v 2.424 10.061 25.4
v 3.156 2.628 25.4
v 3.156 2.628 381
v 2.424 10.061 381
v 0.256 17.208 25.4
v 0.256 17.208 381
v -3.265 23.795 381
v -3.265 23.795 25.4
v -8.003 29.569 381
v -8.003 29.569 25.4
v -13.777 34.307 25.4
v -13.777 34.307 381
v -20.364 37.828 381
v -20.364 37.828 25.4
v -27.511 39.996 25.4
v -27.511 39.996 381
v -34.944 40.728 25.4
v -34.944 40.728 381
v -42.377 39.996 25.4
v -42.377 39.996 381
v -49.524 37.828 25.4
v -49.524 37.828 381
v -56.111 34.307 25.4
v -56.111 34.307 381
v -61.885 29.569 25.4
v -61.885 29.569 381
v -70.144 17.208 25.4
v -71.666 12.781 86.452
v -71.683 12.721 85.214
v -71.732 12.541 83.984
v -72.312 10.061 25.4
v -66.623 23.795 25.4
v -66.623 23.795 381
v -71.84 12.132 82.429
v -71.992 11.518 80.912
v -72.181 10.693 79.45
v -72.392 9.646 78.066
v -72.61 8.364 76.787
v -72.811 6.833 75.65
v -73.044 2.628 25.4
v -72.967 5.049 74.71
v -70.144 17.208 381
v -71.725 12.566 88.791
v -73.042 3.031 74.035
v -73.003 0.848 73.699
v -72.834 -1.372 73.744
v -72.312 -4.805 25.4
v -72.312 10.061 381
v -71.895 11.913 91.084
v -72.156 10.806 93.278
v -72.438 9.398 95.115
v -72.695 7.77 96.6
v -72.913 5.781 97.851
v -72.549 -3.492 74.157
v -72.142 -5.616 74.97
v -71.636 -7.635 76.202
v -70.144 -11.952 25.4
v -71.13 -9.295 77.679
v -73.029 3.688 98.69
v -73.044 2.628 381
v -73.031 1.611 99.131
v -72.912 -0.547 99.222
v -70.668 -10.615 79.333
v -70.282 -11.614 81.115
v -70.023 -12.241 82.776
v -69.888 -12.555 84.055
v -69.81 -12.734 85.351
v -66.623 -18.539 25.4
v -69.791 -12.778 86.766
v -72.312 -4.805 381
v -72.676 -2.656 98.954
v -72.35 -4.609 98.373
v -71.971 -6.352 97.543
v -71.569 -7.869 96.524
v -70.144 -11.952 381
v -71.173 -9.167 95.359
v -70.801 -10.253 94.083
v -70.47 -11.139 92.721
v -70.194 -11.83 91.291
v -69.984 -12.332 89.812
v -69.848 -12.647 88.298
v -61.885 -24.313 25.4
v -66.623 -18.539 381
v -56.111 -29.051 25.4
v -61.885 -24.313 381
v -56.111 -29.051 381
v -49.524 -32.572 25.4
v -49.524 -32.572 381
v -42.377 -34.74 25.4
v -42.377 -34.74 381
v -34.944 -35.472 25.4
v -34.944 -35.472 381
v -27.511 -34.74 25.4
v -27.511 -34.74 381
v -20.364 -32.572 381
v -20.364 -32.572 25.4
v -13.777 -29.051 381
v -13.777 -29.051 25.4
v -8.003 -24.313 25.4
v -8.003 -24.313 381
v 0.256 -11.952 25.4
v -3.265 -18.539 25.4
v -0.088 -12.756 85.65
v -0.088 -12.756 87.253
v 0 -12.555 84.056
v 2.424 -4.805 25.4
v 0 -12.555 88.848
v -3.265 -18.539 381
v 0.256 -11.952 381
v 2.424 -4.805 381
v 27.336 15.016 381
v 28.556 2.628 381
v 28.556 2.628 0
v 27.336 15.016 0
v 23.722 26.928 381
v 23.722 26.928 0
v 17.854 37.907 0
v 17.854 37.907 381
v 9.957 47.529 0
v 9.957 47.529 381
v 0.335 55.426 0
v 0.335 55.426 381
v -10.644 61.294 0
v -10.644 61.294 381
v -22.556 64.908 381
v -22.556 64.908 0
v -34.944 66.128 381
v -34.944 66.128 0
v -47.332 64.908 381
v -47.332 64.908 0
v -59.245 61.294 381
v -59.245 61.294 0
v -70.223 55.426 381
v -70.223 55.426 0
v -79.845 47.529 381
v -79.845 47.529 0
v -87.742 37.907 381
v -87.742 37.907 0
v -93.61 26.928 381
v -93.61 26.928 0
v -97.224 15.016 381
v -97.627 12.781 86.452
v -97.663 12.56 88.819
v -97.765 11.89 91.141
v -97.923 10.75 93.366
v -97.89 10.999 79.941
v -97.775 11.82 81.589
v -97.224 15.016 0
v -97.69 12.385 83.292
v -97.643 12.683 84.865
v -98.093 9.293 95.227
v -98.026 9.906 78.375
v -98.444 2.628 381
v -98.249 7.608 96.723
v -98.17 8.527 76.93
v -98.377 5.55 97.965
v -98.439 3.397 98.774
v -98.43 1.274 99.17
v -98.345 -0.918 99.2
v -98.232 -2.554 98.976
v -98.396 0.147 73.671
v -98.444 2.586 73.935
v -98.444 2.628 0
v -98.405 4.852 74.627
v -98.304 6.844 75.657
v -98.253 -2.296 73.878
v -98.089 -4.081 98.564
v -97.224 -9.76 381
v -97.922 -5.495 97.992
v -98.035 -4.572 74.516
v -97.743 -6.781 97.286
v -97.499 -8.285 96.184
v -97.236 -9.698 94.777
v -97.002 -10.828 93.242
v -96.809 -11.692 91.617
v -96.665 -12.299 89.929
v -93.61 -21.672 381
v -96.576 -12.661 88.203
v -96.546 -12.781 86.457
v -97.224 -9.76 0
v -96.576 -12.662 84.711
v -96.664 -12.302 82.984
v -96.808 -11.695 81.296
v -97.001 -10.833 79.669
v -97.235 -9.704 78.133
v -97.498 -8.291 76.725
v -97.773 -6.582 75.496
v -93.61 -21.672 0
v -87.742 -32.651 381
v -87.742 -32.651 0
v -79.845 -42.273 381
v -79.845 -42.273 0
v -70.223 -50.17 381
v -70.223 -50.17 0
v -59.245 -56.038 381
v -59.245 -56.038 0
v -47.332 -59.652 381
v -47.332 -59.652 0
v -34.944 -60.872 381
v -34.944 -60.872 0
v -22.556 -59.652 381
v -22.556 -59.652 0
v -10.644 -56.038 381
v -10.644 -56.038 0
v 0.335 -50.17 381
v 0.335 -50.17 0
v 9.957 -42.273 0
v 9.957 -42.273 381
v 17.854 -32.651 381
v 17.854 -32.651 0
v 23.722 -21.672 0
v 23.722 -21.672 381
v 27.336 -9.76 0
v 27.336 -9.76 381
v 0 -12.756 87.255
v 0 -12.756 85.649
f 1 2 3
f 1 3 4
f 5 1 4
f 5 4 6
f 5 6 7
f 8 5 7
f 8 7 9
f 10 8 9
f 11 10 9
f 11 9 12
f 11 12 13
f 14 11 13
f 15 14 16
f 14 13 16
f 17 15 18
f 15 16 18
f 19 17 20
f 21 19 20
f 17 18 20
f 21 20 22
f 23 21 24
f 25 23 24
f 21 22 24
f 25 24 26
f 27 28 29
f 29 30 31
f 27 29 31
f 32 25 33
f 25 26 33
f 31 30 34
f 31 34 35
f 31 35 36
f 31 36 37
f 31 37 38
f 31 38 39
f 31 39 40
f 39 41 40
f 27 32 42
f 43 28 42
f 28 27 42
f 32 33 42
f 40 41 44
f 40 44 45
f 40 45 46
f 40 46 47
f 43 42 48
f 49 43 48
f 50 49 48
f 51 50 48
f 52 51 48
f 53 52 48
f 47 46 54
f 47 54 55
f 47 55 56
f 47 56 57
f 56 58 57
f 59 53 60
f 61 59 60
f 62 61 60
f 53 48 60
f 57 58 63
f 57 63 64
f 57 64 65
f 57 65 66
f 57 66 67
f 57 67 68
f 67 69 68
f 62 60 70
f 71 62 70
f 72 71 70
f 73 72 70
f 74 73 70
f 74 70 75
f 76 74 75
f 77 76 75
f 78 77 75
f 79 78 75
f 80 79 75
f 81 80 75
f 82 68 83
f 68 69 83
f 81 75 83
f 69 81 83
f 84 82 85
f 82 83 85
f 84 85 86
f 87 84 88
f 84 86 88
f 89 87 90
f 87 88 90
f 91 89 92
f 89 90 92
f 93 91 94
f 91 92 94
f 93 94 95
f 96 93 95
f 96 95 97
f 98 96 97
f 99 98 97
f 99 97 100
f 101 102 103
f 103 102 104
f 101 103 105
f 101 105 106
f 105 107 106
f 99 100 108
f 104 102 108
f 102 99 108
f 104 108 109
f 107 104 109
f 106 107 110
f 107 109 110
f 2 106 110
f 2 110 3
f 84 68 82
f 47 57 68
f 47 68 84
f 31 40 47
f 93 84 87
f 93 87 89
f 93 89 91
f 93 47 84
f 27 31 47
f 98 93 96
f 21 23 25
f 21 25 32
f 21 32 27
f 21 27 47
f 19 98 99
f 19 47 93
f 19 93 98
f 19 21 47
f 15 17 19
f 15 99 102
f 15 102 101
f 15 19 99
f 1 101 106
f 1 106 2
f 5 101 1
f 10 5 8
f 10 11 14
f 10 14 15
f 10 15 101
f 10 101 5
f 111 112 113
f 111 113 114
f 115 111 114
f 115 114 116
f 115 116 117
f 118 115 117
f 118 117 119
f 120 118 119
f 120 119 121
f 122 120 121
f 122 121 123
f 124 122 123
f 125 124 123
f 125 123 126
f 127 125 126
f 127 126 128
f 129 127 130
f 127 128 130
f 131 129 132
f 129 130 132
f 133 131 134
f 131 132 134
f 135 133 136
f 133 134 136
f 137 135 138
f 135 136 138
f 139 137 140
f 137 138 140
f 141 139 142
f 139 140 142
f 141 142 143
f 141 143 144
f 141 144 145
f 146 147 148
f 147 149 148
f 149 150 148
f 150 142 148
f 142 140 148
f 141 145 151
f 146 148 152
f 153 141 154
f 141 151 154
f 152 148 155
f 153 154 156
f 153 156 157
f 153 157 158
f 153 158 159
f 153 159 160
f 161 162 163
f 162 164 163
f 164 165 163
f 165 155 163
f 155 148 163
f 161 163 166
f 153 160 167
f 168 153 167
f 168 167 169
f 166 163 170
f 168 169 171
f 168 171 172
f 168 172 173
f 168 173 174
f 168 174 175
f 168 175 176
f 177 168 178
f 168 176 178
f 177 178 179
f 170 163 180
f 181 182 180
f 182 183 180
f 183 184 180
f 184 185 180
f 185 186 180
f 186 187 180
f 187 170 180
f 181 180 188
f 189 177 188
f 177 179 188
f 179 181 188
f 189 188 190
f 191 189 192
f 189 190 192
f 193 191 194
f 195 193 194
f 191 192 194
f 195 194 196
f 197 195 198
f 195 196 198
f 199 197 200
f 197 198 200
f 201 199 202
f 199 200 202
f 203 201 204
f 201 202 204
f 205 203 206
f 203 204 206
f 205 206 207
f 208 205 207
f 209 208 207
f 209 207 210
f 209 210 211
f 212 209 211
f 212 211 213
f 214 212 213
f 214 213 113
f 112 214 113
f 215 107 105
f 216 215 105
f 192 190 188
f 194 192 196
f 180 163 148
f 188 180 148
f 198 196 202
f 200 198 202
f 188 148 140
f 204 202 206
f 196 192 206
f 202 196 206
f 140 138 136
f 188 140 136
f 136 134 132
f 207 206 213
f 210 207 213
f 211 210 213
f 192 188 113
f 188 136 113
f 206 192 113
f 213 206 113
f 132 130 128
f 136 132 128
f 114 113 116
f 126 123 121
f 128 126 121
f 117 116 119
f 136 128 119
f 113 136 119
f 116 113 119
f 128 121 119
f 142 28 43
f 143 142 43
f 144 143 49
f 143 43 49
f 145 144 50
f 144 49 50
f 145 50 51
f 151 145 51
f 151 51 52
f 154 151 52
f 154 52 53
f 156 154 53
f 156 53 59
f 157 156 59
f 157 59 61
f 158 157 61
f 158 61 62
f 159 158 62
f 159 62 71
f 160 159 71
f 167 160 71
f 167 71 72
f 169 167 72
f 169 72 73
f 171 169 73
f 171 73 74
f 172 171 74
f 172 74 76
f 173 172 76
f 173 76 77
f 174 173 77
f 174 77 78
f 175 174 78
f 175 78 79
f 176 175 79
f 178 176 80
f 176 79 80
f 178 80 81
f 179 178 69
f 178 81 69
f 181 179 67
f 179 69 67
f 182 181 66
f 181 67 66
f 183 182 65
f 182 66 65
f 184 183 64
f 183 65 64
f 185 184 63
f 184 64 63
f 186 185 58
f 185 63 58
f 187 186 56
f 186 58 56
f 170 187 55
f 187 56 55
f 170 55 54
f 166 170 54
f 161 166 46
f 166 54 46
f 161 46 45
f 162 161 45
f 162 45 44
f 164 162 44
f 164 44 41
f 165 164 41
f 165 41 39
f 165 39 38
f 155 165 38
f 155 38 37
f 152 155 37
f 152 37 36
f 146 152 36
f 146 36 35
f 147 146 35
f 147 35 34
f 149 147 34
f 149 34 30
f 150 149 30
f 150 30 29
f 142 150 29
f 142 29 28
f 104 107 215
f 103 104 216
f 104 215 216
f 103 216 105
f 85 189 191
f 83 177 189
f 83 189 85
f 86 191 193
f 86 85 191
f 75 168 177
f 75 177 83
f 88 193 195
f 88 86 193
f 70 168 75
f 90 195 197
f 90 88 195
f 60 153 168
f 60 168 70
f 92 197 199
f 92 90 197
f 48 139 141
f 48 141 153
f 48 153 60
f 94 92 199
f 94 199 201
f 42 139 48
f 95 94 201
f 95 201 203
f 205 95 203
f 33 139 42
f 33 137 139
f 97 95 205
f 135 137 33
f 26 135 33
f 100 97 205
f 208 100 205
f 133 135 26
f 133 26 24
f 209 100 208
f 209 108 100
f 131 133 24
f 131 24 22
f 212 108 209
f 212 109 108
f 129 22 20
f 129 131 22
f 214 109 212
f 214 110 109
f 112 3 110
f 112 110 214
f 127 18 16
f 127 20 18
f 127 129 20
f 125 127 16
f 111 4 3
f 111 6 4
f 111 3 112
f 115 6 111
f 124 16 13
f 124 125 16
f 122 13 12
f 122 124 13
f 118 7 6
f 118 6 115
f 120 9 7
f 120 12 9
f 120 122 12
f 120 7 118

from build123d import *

# Parameters (mm, degrees)
F1_DEPTH = 381
F2_R     = 38.1
F3_DEPTH = 355.6
F4_R     = 12.78146
F5_DEPTH = 127


with BuildPart() as f1:
    # F0 (on Top) → F1 (new body)
    with BuildSketch(Plane.XY):
        with BuildLine():
            ThreePointArc((-98.444128, 2.627907), (-34.944128, -60.872093), (28.555872, 2.627907))
            ThreePointArc((28.555872, 2.627907), (-34.944128, 66.127907), (-98.444128, 2.627907))
        make_face()
    extrude(amount=F1_DEPTH)

    # F2 (on face) → F3 (cut)
    with BuildSketch(Plane.XY.offset(381)):
        with Locations((-34.944128, 2.627907)):
            Circle(F2_R)
    extrude(amount=-F3_DEPTH, mode=Mode.SUBTRACT)

    # F4 (on Right) → F5 (cut)
    with BuildSketch(Plane.YZ):
        with Locations((0, 86.451918)):
            Circle(F4_R)
    extrude(amount=-F5_DEPTH, mode=Mode.SUBTRACT)


solid = f1.part
